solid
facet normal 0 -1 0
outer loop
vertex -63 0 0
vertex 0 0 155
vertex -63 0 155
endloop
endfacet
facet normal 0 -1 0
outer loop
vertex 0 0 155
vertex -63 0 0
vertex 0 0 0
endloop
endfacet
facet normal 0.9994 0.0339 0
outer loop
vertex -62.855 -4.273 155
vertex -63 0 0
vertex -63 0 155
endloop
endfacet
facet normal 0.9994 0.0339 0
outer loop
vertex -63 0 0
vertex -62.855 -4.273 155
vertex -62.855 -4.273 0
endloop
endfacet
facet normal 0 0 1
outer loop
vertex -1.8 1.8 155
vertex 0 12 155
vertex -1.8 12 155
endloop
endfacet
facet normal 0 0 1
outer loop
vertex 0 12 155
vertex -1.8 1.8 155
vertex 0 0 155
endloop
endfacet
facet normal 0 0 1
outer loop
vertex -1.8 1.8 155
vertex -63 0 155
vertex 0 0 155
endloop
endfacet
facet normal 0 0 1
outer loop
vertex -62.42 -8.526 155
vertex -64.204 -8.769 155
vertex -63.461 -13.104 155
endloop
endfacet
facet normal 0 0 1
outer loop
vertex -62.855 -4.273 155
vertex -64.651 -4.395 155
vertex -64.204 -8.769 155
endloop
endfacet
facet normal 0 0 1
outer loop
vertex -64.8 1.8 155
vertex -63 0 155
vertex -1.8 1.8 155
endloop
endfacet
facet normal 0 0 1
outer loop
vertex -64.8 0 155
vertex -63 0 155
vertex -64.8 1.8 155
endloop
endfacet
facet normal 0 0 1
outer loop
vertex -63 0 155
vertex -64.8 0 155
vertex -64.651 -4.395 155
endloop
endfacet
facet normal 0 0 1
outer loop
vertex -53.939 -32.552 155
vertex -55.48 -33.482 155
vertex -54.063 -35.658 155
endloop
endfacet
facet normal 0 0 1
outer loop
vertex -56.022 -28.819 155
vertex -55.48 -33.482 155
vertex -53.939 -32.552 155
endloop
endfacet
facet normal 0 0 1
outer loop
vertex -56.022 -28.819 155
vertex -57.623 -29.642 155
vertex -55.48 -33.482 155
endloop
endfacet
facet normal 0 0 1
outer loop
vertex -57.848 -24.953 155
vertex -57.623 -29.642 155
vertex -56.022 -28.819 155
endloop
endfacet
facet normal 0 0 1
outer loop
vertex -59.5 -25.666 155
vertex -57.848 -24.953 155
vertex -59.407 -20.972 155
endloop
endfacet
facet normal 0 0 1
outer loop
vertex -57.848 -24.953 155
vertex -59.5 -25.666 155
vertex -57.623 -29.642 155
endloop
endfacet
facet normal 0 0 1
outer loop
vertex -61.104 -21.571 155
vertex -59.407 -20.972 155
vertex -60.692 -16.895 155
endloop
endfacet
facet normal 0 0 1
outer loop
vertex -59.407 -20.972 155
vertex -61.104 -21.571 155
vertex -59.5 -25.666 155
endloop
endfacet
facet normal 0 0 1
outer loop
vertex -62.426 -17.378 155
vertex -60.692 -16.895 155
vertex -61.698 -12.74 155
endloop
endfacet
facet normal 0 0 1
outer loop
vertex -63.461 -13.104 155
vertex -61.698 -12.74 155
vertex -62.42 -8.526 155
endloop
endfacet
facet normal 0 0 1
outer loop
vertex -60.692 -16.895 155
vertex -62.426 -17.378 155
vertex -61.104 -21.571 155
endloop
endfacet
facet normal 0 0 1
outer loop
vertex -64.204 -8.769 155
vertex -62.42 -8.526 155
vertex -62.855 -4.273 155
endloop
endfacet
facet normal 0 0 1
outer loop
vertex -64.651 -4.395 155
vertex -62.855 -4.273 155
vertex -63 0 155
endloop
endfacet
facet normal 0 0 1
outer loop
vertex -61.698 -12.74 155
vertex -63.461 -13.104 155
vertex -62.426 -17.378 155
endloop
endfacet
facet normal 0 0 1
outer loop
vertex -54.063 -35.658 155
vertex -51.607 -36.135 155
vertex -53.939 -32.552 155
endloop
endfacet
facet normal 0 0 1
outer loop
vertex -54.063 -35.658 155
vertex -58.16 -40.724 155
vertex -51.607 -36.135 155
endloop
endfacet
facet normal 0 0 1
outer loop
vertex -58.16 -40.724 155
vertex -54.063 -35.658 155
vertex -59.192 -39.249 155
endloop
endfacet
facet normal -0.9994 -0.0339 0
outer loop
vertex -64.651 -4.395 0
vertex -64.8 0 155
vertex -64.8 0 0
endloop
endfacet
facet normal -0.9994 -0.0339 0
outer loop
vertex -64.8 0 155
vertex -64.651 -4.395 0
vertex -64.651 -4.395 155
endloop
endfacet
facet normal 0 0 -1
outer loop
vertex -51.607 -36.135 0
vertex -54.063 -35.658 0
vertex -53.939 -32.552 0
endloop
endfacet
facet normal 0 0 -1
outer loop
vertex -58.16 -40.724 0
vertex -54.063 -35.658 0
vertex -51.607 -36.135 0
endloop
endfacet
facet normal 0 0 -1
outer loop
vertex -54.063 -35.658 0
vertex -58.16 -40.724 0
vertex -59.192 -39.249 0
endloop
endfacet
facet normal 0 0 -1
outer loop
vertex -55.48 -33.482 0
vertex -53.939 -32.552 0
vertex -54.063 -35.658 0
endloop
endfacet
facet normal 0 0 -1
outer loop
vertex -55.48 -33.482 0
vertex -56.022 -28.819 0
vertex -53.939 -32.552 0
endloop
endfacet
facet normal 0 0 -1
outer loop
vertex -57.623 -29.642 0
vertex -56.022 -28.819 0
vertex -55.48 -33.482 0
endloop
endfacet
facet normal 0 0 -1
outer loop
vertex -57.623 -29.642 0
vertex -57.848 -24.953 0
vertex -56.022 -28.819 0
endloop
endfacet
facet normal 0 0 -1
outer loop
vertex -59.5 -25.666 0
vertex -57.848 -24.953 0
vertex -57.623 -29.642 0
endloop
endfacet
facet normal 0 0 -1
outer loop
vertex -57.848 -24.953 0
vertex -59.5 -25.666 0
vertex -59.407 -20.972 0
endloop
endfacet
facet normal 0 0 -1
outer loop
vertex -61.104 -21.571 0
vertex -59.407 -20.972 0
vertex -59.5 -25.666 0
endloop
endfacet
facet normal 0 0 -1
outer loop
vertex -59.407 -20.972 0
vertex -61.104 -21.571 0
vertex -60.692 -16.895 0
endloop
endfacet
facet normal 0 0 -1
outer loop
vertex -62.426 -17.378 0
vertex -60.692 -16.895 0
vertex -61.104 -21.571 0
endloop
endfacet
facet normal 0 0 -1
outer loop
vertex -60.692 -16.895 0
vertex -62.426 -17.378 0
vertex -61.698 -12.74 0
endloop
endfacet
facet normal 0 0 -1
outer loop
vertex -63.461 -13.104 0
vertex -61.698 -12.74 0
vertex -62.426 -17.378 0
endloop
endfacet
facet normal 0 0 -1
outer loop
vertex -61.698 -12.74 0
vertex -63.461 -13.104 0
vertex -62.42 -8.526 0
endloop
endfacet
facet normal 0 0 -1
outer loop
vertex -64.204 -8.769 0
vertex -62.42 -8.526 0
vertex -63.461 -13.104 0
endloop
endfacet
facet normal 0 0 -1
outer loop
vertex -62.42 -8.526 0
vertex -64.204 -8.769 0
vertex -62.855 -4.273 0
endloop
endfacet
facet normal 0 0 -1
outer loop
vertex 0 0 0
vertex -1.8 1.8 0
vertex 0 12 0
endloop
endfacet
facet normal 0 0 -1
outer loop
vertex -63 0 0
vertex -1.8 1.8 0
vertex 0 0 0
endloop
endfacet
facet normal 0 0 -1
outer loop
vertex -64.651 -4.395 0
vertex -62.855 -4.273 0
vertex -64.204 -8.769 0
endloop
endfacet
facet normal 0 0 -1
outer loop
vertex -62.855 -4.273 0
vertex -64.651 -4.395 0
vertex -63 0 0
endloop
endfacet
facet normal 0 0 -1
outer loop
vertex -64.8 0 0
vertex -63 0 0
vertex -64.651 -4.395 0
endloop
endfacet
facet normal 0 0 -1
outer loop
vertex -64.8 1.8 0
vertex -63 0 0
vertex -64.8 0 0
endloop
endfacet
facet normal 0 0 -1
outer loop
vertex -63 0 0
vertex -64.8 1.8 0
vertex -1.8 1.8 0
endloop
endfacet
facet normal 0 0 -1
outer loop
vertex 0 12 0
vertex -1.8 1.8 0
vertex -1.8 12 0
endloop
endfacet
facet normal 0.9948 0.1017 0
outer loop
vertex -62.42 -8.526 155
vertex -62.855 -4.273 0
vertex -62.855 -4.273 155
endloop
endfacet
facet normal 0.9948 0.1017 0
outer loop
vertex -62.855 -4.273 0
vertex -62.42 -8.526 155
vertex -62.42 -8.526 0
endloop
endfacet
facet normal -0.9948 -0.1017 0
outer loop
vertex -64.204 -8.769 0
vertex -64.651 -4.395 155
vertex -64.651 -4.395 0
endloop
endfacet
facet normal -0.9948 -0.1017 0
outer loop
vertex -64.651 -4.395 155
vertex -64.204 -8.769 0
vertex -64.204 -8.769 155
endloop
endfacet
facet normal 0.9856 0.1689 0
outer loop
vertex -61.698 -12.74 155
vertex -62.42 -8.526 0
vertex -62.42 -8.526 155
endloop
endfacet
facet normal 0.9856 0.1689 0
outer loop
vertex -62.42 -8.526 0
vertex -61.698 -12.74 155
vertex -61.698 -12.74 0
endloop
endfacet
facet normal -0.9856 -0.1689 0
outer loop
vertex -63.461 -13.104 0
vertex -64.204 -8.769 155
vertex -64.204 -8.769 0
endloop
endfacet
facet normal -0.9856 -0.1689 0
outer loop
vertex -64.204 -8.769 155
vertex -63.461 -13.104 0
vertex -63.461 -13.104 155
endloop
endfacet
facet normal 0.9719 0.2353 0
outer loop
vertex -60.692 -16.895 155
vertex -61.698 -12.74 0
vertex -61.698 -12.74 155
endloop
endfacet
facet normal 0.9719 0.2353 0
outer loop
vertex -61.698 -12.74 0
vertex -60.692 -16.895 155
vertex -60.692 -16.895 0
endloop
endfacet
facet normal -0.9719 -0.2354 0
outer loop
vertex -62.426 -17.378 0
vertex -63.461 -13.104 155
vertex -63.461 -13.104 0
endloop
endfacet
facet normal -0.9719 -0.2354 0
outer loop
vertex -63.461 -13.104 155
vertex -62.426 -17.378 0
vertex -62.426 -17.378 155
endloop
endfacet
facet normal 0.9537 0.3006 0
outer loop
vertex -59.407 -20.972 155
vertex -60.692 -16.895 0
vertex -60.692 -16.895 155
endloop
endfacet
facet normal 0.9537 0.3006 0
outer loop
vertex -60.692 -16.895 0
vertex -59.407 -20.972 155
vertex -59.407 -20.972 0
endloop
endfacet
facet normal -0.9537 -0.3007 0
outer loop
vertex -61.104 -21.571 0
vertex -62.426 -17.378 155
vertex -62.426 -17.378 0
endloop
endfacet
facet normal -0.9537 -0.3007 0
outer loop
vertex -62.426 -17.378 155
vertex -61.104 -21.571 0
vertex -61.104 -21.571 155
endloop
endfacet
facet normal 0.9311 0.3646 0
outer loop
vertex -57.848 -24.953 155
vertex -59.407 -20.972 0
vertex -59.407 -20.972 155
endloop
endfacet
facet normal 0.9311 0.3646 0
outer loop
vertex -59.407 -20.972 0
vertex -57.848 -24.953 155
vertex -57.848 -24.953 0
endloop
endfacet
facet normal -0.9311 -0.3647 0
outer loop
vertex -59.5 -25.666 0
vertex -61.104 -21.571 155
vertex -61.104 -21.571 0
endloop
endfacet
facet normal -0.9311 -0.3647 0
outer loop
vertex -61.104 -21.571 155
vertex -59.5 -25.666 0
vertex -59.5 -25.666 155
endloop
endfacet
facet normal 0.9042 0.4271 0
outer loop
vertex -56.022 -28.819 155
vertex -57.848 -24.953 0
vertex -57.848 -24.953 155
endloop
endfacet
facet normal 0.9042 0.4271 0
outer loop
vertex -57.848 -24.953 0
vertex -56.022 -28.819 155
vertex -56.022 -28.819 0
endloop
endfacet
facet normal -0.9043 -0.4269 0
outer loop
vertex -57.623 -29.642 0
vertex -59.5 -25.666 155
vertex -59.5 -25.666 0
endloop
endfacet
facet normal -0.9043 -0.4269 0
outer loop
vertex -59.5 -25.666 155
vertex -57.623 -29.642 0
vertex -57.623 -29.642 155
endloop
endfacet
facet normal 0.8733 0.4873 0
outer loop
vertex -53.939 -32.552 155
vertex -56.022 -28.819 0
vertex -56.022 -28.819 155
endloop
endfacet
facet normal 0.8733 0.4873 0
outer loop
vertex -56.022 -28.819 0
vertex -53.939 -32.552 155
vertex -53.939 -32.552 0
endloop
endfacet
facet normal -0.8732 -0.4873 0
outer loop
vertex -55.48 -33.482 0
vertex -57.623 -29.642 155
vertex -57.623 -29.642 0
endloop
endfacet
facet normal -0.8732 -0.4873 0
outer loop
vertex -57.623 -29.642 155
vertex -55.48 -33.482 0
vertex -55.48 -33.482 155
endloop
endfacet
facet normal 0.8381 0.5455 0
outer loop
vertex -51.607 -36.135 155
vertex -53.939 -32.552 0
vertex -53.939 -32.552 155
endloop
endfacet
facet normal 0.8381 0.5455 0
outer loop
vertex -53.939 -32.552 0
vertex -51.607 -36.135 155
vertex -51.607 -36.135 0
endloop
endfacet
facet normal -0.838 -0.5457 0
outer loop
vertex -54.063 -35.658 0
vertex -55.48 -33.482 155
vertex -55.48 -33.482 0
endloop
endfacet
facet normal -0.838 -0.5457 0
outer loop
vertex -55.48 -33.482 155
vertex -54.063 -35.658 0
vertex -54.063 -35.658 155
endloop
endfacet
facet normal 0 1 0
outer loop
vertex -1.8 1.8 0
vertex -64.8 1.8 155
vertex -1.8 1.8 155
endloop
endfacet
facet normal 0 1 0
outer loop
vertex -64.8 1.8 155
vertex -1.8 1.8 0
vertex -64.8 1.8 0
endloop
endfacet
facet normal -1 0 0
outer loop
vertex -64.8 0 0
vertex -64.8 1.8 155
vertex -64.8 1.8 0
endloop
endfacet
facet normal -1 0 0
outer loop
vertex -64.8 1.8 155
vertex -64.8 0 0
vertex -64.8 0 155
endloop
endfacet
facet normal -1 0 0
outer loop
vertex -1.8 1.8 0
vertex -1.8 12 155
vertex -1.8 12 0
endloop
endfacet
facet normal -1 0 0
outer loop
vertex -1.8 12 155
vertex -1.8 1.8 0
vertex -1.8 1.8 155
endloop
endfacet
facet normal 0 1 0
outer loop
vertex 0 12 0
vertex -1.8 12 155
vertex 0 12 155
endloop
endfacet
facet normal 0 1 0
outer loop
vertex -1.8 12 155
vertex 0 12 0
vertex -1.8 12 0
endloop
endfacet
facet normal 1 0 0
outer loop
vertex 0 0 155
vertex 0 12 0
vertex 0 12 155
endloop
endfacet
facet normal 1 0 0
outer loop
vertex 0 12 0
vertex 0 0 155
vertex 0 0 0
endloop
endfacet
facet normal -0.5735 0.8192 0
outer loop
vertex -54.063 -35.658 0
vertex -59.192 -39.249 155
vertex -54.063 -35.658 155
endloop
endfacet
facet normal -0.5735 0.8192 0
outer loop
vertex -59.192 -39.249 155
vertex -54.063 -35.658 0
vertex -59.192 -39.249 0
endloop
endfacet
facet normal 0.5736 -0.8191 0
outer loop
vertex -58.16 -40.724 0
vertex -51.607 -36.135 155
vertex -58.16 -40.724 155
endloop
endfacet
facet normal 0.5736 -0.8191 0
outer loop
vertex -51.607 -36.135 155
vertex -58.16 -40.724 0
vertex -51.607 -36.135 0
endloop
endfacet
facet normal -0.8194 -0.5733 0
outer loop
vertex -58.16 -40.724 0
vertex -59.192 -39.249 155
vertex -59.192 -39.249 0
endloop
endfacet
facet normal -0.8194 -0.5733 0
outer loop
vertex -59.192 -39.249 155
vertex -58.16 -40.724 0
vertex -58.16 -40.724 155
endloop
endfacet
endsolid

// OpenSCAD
/*

Universal Stand
Customizable stand for your devices and other stuff.

by IOIO72 aka Tamio Patrick Honma (https://honma.de)

This work is licensed under the Creative Commons Attribution-NonCommercial-ShareAlike 4.0 International License. To view a copy of this license, visit http://creativecommons.org/licenses/by-nc-sa/4.0/ or send a letter to Creative Commons, PO Box 1866, Mountain View, CA 94042, USA.


Updates

2022-02-21: Add experimental feature Reduce Filament Consumption


Description

Whether you want to use a device in an angled position or present something in an optimal orientation, you can design a stand to suit your needs.

This model is customizable to generate STL files for your individual use case. Included in this package are some examples and inspirations for smartphones, tablets, notebooks, business cards, table name cards, print magazines, keyboards, etc.


Customization

Basic configuration:

1. Measure the `width` and `depth` of your device or object in millimeters and enter the values into the customizer.
2. Determine the height of the device at the front of the stand that will prevent the device or object from sliding off the stand. This can be the measured height of your device or object, if applicable. Enter the value of the `stopper height` into the customizer.
3. Enter the desired `angle` at which you want your device or object to be presented, which is the main purpose of the stand.

Foot configuration:

1. Define the `foot depth` to prevent the stand of sliding, especially concerning interactive devices. You should add a rubber tape on the bottom of the foot or a weight on top of it.
2. You are able to set the `foot orientation` behind, centered or in front of the stand leg.

Advanced configuration:

1. Define the `stand thickness` in relationship of the steadiness requirements and material consumption.
2. Define the `height` of the table plate for your device. The height is the thickness of the plate on which your device will be placed, if you will.
3. Set the number of fragments (`$fn`), especially to smooth or de-smooth the curve of the leg.

Reduce Filament Consumption (experimental) configuration:

1. Use these experimental parameters with caution. Be careful not to overstress your printer's ability to print overhangs. Also, find a good compromise between stand strength and filament reduction. You can also increase the `stand thickness` in the Advanced Configuration section.
2. The higher the `decrease percentage`, the larger the hole and the lower the steadiness of the stand.
3. To apply the filament consumption reduction to the table top of the stand, enable the `decrease table` option.
4. To apply the filament consumption reduction to the back plate (leg) of the stand, activate the `decrease back` option.

Tips:

* To test your configured stand, you could consider to cancel the print after some layers and test the angle and steadiness.
* If you use the stand for an interactive device, you should glue a rubber tape on the bottom of the foot to prevent the stand to slide away while using the device. To improve the adhesion, you may increase the depth of the foot in the foot options. Additionally you may add a weight on top of the foot.


Use OpenSCAD

As the Thingiverse customizer has some issues, it's better to use OpenSCAD instead.

1. **Download and install:** [OpenSCAD](http://openscad.org/) version 2021.01 or newer
2. **Download:** The *.scad file of this model.
3. **Start** OpenSCAD and **open** the *.scad file in it.
4. **Open the customizer** via the menu "Window/Customizer"

Now you can configure the model and use the `F5` key to render the preview of your changes.

Export your STL file:

If you're done with your model settings, you can export the STL file:

1. Render the mesh by pressing the `F6` key.
2. Wait until the rendering is finished. This might take some minutes.
3. Export the STL file by pressing the `F7` key.

Optionally save your configuration:

If you like to use your configuration as a template for further models, it's a good idea, to save your configuration:

1. Click the `+` symbol in the customizer, which you find beside the configuration selector drop-down in the second line of the customizer.
2. Give your configuration a name.

Use the drop-down menu to access your saved configurations.


Help others and post a Remix

Your configuration may be helpful for others. Consider to upload your STL file as a [remake of this model](https://www.thingiverse.com/thing:5245158/remix).
*/


/* [Basic] */

// Width of your device
width = 155;

// Depth of your device
depth = 63;

// Height of the bottom stopper ≈ device height
stopper_height = 12;

// Angle
angle = 35;


/* [Foot] */

// Depth of stand foot
foot_depth = 8;

// Foot orientation in relation to the leg of the stand
foot_orientation = "behind"; // ["behind", "centered", "infront":"in front"]


/* [Advanced] */

// Thickness of stand walls
stand_thickness = 1.8;

// Height of the table plate
height = 1.8;


// Number of fragments
$fn = 100; // [1:150]


/* [Reduce Filament Consumption (experimental)] */

// Percentage of decrease
decrease_percentage = 85; // [50:95]

// Decrease for table plate
decrease_table = false;

// Decrease for back plate
decrease_back = false;


function decrease(size, percent) = size * percent / 100;

module printable_rotation(width, height) {
  rotate([0, 90, 90])
  translate([-width, height, 0])
  children();
};

module stand(width, depth, height, thickness) {
  rotate_extrude(angle = angle) // extrudes to pribtable rotation
  translate([-height, 0, 0])
  rotate([0, 0, 90])
  translate([0, depth - thickness, 0])
  square([width, thickness]);
};

module stand_through_hole(through_hole, w, h) {
  if (through_hole) {
    rotate([180, 270, 90 - ((180 - angle) / 2)])
    translate([w, h, 0])
    rotate([180, 0, 0])
    scale([1, 1, 1000])
    children();
  } else {
    children();
  };
};

module reduce_filamant(reduce = false, through_hole = false, width, height, depth) {
  w = decrease(width, decrease_percentage);
  h = decrease(height, decrease_percentage);
  if (reduce) {
    difference() {
      children();
      stand_through_hole(through_hole, 0, height / 2)
      translate([width / 2, height / 2, -depth / 2])
      linear_extrude(depth * 2)
      resize([w, h])
      circle(r=w);
    };
  } else {
    children();
  };
};


/* Stand / Back Plate */
reduce_filamant(decrease_back, true, width, sin(angle) * depth, height)
stand(width, depth, height, stand_thickness);

/* Table Plate */
printable_rotation(width, height)
reduce_filamant(decrease_table, false, width, depth, height)
cube([width, depth, height]);

/* Stopper */
printable_rotation(width, height - stand_thickness)
cube([width, stand_thickness, stopper_height]);

/* Foot */
rotate([0, 0, angle])
translate([foot_orientation == "infront" ? foot_depth - stand_thickness : 0, 0, 0])
translate([foot_orientation == "centered" ? (foot_depth - stand_thickness) / 2 : 0, 0, 0])
printable_rotation(width, height + depth - stand_thickness)
cube([width, foot_depth, stand_thickness]);
